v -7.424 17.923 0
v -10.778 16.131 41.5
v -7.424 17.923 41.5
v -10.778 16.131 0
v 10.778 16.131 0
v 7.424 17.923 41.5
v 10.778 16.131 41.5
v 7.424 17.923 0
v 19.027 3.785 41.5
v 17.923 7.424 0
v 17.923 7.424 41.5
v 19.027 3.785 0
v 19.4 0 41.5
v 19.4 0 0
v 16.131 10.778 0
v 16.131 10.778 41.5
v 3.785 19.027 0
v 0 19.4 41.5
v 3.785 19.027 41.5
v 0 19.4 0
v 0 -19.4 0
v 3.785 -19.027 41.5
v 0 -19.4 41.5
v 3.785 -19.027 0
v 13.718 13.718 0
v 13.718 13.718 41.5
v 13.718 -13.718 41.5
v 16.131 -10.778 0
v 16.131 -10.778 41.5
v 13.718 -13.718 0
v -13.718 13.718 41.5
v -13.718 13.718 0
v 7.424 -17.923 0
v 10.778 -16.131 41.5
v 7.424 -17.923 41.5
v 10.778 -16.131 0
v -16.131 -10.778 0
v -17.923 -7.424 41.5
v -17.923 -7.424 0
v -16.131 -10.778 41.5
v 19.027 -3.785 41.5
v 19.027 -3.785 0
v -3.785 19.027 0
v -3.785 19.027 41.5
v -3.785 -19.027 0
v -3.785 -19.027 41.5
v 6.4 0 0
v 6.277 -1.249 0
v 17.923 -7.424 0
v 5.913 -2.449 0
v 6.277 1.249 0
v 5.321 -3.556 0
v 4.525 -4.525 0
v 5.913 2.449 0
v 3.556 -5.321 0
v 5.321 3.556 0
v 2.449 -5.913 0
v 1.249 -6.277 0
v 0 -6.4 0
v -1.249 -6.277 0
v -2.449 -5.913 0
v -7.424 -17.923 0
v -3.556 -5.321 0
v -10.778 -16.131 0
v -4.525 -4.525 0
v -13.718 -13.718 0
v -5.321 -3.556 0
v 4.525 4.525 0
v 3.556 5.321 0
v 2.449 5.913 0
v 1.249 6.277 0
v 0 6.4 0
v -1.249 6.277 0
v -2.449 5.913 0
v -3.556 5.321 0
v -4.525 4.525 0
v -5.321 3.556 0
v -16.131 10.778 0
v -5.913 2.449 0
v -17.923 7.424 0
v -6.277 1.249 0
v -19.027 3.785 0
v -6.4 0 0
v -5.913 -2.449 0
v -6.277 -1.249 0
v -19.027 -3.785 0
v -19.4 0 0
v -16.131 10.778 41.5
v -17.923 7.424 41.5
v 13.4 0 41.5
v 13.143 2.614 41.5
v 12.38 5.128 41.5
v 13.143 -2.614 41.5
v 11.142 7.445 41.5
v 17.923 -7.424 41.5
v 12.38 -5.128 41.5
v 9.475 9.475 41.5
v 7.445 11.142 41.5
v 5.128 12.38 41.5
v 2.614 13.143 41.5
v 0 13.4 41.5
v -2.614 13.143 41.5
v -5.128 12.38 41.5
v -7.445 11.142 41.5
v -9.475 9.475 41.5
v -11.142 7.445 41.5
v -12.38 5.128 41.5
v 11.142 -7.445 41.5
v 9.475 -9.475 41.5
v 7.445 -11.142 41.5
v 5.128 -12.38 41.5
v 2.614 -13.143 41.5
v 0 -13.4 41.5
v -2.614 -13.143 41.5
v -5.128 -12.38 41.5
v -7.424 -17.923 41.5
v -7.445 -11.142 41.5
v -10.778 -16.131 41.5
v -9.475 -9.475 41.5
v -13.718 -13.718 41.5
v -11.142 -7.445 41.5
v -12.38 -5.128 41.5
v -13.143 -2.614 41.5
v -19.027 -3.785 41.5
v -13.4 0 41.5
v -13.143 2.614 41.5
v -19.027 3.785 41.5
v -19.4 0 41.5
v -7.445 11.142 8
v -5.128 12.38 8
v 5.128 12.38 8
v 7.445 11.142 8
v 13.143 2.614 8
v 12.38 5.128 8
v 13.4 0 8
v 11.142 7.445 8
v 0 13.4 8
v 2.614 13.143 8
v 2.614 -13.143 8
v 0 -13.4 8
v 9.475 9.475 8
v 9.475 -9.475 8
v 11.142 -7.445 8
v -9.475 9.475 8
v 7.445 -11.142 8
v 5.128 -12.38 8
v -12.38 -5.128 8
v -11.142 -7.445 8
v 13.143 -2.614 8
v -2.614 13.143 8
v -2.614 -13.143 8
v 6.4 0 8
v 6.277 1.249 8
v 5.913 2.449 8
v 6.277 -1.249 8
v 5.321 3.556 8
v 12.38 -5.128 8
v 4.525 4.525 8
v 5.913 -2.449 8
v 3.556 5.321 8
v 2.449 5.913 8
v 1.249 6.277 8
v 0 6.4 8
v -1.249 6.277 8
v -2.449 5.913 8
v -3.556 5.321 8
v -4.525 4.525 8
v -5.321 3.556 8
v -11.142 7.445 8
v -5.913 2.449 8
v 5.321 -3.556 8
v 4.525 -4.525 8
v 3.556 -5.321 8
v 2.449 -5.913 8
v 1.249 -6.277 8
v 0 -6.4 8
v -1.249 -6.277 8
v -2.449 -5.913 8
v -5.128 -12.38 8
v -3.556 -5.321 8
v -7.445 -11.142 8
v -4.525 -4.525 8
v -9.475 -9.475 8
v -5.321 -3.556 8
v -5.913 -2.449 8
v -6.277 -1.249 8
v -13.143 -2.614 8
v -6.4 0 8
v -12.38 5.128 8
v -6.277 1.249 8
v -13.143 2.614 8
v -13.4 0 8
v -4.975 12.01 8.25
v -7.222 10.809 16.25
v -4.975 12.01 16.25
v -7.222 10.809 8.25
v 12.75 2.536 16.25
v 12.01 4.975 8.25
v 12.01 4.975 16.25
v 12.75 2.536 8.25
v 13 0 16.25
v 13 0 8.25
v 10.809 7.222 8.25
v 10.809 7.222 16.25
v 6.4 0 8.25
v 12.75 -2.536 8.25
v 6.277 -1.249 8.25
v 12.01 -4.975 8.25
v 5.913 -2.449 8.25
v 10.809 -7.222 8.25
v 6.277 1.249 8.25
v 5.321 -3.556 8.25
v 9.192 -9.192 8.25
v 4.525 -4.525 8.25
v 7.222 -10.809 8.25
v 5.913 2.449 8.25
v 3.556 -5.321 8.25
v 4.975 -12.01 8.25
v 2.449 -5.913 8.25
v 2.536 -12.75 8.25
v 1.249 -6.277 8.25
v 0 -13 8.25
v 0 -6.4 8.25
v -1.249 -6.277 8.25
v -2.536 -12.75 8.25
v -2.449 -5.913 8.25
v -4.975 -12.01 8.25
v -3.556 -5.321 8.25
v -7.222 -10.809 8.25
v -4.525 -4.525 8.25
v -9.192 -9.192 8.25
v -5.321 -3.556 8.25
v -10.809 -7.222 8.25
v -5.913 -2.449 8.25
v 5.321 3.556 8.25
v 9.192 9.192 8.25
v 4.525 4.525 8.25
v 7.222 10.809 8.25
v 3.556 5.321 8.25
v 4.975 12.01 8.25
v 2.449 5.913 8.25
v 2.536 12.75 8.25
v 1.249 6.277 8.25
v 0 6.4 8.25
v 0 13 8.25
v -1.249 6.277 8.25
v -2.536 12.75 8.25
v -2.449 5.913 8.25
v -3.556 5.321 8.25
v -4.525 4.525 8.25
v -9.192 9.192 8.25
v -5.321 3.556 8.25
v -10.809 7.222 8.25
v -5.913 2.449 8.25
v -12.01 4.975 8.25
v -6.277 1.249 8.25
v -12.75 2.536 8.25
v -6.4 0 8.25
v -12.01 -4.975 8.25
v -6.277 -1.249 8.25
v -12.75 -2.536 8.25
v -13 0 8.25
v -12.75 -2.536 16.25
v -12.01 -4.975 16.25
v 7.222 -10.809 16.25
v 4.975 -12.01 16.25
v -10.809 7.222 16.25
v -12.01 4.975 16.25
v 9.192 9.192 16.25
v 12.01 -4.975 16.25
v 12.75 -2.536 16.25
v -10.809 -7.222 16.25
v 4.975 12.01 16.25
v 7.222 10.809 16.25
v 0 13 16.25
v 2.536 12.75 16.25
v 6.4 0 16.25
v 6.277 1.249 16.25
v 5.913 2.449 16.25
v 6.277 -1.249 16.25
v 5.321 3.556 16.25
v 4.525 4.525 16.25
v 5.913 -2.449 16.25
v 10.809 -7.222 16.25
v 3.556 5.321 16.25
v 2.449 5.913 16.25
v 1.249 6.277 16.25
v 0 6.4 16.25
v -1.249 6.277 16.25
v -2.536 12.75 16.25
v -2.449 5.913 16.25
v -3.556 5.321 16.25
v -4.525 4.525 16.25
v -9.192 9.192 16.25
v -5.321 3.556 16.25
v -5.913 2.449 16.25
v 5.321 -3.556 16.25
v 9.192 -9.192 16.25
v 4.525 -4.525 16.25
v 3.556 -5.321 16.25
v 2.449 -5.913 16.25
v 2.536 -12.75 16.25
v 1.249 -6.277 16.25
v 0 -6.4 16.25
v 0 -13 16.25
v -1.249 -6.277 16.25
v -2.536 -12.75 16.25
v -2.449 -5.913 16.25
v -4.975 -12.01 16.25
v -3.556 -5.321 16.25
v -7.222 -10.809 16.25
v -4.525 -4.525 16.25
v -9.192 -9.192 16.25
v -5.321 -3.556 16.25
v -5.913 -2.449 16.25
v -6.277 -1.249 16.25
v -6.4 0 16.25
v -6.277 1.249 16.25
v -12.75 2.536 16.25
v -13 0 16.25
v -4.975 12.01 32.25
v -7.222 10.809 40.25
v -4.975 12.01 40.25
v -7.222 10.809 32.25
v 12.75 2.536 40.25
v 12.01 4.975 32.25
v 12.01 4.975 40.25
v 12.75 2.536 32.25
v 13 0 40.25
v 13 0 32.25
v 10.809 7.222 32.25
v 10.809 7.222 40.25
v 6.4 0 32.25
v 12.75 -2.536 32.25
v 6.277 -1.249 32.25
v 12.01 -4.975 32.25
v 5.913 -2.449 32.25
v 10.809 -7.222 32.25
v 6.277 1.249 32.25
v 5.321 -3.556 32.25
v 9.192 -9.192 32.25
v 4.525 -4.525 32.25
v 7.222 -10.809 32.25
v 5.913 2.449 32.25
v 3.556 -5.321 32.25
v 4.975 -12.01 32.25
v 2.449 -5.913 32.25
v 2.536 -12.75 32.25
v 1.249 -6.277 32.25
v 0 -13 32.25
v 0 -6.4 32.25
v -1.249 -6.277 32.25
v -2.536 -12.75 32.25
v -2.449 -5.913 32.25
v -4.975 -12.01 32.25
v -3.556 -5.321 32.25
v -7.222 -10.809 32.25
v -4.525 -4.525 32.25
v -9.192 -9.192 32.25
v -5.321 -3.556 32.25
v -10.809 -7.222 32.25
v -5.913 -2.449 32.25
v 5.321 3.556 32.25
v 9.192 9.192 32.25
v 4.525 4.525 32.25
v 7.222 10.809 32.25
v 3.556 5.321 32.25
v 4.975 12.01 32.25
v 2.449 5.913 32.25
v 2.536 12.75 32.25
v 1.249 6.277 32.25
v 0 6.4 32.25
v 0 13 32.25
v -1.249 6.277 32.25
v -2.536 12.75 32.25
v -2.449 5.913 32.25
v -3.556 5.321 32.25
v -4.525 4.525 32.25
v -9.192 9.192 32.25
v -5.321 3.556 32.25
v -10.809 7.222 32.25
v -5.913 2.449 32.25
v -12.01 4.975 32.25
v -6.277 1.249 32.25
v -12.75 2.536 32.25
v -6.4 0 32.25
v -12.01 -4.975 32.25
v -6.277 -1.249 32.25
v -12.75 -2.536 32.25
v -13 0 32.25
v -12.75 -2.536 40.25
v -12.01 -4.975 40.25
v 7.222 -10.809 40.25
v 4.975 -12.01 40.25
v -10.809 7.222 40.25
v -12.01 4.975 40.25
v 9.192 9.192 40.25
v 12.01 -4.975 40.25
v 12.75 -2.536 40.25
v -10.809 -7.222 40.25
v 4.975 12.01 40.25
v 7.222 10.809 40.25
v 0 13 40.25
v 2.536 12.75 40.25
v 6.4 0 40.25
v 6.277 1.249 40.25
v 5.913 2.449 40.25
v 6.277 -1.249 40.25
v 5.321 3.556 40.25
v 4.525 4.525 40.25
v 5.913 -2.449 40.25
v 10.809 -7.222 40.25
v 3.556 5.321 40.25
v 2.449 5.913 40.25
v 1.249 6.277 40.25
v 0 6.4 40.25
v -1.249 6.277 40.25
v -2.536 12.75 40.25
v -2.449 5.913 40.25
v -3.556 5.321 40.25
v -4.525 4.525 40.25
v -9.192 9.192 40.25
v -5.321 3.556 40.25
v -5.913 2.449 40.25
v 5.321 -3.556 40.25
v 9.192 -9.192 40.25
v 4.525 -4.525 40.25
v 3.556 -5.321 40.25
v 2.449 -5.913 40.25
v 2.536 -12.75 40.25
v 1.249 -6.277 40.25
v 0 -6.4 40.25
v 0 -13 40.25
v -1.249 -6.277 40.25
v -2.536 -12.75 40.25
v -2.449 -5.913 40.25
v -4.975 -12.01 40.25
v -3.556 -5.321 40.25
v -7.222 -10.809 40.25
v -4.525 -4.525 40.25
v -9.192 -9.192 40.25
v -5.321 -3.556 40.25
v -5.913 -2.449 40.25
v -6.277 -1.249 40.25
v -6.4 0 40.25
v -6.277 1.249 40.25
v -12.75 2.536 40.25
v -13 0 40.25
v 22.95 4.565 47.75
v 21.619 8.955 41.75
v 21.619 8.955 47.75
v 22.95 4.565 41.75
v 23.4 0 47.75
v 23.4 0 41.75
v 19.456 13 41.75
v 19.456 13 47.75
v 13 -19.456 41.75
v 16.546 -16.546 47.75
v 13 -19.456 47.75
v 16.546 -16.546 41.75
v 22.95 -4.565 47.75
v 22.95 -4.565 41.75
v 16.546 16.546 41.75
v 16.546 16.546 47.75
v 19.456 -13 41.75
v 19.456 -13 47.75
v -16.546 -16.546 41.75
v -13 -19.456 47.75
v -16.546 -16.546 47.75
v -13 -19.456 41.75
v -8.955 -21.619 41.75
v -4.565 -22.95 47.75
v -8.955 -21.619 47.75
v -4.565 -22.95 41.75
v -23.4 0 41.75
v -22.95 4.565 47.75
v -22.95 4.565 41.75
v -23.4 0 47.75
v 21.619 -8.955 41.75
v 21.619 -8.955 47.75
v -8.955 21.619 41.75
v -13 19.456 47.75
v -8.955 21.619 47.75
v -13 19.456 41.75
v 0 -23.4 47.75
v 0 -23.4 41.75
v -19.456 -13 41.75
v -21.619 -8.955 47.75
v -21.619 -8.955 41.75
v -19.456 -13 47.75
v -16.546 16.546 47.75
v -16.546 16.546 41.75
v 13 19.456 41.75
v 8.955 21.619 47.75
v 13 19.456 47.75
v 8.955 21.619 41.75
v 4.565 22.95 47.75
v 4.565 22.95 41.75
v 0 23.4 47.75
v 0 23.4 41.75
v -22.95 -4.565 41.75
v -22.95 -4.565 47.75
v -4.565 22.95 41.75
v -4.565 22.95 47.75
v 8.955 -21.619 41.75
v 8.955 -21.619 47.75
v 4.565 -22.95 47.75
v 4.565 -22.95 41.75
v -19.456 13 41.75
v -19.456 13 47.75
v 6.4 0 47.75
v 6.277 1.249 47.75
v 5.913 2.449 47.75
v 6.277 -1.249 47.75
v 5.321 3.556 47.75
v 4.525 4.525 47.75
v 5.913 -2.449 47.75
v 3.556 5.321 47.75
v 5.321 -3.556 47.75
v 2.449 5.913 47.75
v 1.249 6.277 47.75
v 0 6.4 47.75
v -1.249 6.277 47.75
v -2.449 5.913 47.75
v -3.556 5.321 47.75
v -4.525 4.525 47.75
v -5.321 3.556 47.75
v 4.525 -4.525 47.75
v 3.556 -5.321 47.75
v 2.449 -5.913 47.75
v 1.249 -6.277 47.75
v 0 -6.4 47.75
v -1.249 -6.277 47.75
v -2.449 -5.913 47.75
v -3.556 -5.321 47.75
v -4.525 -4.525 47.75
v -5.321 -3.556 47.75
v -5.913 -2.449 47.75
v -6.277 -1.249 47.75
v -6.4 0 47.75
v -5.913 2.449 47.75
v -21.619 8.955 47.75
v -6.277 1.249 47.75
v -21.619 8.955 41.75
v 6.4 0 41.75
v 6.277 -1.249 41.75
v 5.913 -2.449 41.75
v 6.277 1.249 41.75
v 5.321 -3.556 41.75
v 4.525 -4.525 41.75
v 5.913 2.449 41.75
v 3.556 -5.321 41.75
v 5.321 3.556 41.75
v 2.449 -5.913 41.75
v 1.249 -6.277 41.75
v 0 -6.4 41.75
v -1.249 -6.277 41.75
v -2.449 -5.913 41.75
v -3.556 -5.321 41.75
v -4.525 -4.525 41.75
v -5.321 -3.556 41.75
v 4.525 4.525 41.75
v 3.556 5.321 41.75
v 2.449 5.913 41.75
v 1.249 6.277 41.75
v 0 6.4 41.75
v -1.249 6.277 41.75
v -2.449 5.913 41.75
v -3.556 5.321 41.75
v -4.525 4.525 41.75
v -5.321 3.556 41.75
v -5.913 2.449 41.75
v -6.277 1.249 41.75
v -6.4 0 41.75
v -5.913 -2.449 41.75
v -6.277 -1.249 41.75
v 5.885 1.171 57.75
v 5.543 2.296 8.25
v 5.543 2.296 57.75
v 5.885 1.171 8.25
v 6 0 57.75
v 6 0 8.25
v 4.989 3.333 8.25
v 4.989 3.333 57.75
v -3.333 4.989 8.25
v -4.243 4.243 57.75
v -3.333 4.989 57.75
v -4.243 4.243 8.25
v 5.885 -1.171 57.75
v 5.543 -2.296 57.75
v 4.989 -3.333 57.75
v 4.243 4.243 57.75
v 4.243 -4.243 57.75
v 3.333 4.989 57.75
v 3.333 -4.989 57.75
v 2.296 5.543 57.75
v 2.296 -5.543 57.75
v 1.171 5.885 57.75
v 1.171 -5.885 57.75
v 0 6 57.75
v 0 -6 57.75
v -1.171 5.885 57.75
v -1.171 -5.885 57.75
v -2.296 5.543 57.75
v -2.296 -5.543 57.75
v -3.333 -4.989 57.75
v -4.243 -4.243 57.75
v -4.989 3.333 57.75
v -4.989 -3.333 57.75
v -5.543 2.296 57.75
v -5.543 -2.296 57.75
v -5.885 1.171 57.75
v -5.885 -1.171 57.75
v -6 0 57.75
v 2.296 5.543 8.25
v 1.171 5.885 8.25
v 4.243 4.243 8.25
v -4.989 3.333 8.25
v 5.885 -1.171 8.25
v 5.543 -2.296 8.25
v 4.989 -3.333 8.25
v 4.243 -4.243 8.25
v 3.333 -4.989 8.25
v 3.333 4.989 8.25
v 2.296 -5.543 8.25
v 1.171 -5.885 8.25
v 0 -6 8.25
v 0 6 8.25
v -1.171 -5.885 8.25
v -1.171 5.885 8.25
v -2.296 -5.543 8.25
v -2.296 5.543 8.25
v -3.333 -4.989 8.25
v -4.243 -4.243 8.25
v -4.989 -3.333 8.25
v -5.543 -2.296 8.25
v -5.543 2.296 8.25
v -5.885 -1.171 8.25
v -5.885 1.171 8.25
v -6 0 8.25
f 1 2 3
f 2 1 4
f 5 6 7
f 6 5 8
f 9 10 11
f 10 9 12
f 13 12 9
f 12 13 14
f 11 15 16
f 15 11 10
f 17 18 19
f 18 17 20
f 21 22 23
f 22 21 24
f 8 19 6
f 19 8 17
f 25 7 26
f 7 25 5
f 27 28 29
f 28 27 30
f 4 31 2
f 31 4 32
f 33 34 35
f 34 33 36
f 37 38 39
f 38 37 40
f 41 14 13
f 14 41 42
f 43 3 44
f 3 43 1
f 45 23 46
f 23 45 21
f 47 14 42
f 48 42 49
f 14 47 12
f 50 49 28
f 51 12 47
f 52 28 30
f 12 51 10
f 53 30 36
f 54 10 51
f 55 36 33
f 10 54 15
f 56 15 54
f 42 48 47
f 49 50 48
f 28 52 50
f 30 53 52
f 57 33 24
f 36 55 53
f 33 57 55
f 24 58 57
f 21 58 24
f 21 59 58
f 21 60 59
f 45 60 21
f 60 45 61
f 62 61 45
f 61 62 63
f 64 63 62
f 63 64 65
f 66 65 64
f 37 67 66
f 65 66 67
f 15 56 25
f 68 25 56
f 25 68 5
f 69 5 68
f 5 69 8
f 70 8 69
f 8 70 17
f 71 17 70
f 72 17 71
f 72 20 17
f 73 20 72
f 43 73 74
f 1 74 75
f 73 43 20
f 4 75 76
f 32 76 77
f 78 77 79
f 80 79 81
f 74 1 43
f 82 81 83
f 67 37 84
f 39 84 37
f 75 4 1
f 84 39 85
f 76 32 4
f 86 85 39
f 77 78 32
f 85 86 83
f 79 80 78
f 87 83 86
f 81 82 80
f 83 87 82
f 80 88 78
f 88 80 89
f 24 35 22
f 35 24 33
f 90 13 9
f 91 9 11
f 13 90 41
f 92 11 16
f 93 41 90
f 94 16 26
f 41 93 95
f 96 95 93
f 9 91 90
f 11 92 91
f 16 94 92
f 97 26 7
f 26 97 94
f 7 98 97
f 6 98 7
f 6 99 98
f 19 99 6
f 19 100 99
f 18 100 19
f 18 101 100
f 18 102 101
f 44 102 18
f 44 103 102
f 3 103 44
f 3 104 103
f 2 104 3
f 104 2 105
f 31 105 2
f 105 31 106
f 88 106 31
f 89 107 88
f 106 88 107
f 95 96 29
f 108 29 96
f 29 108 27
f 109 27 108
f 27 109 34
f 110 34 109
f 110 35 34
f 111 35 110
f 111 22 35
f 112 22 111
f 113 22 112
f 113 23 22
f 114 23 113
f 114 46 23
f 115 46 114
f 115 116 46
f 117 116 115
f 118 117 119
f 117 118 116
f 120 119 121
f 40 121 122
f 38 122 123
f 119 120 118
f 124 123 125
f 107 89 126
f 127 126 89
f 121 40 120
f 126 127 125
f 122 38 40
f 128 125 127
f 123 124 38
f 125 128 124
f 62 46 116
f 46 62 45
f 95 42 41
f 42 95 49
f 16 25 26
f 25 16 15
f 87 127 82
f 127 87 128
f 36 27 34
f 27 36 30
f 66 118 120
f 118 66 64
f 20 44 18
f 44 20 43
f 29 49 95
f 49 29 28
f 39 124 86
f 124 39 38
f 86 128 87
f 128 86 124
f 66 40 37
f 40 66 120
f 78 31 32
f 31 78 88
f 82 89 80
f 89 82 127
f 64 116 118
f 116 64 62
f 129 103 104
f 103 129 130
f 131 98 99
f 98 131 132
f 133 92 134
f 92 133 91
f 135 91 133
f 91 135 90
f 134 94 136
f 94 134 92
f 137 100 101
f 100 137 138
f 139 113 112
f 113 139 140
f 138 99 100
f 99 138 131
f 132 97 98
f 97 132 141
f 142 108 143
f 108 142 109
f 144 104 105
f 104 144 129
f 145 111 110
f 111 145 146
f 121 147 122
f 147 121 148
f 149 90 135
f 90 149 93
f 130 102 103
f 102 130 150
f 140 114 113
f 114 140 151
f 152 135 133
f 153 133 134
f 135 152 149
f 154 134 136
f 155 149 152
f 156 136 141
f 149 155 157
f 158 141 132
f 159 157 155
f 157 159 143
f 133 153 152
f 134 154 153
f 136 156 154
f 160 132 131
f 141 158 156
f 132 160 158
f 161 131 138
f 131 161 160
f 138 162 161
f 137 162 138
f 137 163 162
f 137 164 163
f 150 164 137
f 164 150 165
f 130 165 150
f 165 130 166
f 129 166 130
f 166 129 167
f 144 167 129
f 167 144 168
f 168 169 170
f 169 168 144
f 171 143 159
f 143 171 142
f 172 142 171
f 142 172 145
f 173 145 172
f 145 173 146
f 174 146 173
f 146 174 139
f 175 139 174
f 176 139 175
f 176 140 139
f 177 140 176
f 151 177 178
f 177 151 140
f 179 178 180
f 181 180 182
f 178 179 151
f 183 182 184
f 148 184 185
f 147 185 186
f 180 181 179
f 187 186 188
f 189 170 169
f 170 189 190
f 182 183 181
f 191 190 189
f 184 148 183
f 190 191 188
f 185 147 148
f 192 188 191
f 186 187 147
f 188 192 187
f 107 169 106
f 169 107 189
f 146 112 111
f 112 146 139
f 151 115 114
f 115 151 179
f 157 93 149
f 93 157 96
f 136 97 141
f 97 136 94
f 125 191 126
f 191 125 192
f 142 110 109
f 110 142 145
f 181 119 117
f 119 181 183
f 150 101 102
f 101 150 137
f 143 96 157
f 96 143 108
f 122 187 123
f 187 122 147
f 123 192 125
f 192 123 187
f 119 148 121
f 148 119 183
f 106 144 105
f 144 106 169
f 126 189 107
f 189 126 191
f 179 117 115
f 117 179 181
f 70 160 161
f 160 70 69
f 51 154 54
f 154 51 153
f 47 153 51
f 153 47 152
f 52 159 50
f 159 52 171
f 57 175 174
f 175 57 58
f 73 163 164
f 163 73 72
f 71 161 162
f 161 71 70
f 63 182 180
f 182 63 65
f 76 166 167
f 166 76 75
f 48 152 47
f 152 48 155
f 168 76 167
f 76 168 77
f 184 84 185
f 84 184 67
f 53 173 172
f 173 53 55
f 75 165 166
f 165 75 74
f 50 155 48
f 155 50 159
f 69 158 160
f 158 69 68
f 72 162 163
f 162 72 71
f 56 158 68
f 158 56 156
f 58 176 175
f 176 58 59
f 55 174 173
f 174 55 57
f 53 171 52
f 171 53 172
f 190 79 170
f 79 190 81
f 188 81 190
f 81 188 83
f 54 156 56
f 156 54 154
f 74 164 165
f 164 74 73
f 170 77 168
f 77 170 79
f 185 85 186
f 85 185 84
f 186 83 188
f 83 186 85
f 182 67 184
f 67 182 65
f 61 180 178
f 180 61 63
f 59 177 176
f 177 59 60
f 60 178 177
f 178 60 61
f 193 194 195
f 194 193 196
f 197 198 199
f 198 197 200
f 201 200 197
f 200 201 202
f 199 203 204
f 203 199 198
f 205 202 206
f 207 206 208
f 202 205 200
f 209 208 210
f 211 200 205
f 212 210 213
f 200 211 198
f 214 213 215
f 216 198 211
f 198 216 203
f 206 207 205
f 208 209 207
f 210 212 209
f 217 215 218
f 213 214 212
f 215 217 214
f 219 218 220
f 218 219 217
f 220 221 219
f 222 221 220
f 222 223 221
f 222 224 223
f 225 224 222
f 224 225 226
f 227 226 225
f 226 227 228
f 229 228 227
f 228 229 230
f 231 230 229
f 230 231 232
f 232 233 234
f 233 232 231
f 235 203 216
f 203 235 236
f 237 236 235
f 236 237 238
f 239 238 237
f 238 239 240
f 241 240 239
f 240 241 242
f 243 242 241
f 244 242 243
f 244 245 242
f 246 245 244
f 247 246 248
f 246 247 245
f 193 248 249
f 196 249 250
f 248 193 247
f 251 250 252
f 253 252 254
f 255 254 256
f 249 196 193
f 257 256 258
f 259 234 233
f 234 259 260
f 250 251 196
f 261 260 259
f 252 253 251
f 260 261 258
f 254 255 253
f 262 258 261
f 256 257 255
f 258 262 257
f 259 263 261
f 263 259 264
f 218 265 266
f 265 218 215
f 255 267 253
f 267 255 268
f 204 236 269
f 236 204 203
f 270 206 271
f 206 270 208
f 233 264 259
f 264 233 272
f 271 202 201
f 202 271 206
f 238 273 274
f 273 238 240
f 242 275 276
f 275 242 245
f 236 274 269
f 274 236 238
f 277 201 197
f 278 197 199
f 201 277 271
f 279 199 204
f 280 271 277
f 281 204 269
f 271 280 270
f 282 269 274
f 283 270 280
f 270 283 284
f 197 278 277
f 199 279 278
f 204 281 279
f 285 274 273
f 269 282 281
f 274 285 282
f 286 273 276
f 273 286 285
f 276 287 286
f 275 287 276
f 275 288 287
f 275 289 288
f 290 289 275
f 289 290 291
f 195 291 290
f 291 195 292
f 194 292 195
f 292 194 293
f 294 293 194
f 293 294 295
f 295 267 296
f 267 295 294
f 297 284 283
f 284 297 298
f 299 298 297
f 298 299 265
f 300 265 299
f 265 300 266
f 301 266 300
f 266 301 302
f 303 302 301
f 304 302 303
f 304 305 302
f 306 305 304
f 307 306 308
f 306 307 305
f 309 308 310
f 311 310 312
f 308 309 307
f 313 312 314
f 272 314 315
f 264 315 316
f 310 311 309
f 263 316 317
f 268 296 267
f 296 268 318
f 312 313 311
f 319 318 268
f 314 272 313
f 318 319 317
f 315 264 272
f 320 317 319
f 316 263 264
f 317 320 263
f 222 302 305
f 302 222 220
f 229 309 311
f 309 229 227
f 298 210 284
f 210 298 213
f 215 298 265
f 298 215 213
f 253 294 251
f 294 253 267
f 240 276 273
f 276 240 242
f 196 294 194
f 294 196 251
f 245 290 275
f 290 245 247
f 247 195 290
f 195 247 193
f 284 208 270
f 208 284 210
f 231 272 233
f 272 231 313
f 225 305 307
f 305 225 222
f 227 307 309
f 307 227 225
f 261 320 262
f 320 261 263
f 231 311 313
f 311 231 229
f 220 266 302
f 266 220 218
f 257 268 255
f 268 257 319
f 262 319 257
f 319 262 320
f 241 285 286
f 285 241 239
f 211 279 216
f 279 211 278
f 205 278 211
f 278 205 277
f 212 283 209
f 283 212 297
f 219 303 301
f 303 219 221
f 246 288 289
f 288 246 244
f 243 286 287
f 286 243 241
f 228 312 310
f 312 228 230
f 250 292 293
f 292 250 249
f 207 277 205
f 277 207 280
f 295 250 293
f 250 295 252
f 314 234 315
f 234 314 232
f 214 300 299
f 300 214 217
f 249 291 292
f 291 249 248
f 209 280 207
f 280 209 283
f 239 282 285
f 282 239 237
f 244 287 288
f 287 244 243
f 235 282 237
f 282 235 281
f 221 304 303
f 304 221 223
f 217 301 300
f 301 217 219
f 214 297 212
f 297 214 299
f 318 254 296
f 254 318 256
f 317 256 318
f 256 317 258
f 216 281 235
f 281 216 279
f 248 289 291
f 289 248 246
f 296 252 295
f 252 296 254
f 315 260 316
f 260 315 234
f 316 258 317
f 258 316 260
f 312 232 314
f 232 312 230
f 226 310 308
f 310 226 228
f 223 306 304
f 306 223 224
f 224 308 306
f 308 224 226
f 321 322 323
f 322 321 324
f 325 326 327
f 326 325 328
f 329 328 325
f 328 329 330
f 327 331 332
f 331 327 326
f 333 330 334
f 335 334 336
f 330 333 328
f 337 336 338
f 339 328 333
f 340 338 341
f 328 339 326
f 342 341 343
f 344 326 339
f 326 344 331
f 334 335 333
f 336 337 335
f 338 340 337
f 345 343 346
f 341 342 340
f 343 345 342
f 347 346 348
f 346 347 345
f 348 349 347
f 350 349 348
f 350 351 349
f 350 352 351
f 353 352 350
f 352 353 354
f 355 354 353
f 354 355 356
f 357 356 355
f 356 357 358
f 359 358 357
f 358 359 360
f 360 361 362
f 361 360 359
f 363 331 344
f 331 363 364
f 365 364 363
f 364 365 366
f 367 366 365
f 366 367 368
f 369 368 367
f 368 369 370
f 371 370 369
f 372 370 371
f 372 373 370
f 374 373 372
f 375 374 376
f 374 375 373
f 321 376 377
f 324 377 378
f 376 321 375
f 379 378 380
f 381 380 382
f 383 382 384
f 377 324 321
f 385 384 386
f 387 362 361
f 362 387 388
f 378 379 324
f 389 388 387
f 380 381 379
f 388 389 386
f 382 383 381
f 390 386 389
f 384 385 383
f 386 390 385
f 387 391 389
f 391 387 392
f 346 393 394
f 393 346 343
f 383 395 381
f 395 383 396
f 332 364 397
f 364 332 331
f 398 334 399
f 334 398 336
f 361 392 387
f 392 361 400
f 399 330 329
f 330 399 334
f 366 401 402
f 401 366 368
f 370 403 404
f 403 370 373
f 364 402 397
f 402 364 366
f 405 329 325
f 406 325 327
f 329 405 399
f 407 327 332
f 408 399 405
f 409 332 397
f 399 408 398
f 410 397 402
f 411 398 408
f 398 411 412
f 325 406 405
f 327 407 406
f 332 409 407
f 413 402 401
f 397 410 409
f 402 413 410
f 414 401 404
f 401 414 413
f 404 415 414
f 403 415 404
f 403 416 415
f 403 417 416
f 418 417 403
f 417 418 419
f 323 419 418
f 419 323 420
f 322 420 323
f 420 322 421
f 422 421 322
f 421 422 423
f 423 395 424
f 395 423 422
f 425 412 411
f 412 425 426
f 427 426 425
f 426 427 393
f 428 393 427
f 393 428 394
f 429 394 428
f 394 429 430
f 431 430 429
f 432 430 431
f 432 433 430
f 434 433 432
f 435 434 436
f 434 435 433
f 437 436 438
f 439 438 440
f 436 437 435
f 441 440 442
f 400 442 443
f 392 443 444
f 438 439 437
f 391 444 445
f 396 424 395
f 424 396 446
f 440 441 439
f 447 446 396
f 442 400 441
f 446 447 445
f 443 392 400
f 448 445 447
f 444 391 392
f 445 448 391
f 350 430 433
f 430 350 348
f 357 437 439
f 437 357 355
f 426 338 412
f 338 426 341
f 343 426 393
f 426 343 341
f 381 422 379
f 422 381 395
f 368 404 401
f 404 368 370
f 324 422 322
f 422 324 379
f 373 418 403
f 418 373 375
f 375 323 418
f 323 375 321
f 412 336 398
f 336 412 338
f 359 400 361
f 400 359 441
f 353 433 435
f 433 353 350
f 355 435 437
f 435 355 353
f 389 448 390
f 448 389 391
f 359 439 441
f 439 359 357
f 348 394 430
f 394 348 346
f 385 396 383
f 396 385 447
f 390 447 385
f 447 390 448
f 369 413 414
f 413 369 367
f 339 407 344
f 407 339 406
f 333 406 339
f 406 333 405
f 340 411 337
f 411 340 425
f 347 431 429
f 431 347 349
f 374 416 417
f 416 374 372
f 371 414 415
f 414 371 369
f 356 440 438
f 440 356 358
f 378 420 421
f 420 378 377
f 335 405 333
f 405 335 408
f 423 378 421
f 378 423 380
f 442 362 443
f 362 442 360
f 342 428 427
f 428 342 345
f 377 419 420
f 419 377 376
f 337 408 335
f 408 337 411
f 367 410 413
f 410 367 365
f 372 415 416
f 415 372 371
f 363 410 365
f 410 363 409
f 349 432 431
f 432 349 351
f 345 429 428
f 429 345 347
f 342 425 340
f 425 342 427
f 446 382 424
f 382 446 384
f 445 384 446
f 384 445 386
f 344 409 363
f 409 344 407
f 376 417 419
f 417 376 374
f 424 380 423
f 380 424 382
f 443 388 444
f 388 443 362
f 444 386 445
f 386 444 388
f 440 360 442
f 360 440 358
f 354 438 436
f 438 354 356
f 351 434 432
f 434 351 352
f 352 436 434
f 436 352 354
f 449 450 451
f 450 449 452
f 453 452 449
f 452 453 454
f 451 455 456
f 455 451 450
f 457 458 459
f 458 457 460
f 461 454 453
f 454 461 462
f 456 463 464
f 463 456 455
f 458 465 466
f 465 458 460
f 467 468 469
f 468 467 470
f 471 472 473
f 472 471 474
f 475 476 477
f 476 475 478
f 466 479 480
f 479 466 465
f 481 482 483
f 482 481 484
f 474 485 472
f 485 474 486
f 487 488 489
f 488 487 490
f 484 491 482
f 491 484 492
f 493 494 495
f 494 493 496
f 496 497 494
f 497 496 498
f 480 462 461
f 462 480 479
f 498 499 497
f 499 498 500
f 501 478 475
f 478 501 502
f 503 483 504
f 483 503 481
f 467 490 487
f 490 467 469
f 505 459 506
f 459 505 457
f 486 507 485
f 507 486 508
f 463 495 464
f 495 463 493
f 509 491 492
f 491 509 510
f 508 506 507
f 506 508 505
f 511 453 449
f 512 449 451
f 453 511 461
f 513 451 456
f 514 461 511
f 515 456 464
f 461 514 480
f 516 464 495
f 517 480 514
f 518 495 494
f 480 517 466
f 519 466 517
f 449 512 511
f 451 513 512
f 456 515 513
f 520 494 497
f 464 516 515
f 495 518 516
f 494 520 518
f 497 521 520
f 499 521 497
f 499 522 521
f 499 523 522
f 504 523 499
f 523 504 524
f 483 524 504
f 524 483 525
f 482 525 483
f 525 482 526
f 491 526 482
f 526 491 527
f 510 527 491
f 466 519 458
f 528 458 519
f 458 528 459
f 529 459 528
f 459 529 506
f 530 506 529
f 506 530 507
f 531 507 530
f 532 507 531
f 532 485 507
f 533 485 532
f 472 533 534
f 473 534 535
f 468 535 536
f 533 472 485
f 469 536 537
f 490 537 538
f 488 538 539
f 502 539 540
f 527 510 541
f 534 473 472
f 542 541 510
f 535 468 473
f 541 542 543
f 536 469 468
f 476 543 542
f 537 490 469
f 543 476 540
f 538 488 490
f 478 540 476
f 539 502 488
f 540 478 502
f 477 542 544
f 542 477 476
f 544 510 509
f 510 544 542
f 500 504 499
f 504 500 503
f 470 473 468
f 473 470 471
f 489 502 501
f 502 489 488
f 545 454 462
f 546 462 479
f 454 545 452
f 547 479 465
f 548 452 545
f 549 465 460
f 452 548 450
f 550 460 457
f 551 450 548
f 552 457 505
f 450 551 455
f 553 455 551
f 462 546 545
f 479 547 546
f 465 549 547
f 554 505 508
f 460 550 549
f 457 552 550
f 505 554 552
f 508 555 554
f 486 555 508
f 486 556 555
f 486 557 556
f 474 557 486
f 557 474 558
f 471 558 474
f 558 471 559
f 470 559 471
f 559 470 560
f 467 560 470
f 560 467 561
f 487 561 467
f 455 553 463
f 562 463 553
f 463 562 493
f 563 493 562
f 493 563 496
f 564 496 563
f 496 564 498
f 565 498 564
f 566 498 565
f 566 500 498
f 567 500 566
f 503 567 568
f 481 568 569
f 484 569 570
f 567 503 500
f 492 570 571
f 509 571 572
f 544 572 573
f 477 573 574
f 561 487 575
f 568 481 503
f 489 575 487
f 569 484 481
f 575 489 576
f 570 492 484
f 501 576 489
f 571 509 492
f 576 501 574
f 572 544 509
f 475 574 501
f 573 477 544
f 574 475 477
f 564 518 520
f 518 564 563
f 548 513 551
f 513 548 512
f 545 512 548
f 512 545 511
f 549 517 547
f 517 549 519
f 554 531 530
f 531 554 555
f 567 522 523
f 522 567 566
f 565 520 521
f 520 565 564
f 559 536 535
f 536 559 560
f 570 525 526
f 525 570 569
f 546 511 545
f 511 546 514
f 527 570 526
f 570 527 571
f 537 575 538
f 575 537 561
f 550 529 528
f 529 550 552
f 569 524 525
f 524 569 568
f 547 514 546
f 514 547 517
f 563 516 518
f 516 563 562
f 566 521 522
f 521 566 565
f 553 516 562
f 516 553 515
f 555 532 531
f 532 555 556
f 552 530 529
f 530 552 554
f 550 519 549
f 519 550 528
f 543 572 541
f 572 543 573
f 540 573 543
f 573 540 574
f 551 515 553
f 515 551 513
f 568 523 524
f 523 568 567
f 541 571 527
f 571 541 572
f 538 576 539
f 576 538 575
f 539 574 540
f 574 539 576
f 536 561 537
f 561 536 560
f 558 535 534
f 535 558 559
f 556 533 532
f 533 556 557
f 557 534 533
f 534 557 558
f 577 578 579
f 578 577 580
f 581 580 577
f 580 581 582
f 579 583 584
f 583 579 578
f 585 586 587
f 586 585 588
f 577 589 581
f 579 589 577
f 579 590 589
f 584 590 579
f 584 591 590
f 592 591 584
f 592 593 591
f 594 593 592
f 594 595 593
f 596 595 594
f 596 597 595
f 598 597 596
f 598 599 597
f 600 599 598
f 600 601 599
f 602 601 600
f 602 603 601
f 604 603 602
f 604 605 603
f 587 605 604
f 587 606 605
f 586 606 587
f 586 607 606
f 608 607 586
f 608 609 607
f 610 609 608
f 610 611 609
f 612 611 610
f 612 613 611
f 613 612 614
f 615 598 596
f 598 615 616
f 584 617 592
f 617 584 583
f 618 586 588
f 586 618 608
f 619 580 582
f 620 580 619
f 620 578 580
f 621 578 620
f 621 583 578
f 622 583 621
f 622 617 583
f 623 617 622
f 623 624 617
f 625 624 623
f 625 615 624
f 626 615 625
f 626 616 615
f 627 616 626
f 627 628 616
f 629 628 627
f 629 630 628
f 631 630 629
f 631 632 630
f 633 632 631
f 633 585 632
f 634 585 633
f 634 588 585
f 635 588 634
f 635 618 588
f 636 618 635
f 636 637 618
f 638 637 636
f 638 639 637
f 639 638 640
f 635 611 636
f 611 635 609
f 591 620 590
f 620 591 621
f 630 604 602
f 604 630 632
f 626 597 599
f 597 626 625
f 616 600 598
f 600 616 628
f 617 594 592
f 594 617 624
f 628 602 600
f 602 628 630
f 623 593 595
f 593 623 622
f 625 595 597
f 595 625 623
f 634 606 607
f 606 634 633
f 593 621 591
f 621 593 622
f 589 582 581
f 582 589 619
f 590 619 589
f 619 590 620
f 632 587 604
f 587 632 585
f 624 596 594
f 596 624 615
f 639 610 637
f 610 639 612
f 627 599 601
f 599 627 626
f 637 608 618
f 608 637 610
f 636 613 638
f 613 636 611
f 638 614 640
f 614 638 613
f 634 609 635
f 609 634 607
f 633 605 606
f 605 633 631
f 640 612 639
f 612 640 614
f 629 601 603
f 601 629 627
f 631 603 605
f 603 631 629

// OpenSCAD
$fn = 32;

// ------------------------------------------------------------------------
// Shaft station: cup d38.8 x 41.5 mm, shaft d12
// Every part is its own module, assembly() places every instance.
// ------------------------------------------------------------------------

// --- part 1 ---
module housing_cup() {
  difference() {
    cylinder(h = 41.5, d = 38.8);
    translate([0, 0, 8]) cylinder(h = 34.5, d = 26.8);
    translate([0, 0, -1]) cylinder(h = 10, d = 12.8);
  }
}

// --- part 2 ---
module bearing_lower() {
  difference() {
      translate([0, 0, 0]) cylinder(h = 8, d = 26);
      translate([0, 0, -1]) cylinder(h = 10, d = 12.8);
    }
}

// --- part 3 ---
module bearing_upper() {
  difference() {
      translate([0, 0, 0]) cylinder(h = 8, d = 26);
      translate([0, 0, -1]) cylinder(h = 10, d = 12.8);
    }
}

// --- part 4 ---
module station_shaft() {
  translate([0, 0, -24.75]) cylinder(h = 49.5, d = 12);
}

// --- part 5 ---
module station_cover() {
  difference() {
    cylinder(h = 6, d = 46.8);
    translate([0, 0, -1]) cylinder(h = 8, d = 12.8);
  }
}

// --- assembly ---
module assembly() {
  color([0.80, 0.24, 0.20]) translate([0, 0, 0]) rotate([0, 0, 0]) housing_cup();
  color([0.20, 0.45, 0.75]) translate([0, 0, 8.25]) rotate([0, 0, 0]) bearing_lower();
  color([0.25, 0.62, 0.32]) translate([0, 0, 32.25]) rotate([0, 0, 0]) bearing_upper();
  color([0.92, 0.70, 0.18]) translate([0, 0, 33]) rotate([0, 0, 0]) station_shaft();
  color([0.58, 0.35, 0.70]) translate([0, 0, 41.75]) rotate([0, 0, 0]) station_cover();
}

assembly();
